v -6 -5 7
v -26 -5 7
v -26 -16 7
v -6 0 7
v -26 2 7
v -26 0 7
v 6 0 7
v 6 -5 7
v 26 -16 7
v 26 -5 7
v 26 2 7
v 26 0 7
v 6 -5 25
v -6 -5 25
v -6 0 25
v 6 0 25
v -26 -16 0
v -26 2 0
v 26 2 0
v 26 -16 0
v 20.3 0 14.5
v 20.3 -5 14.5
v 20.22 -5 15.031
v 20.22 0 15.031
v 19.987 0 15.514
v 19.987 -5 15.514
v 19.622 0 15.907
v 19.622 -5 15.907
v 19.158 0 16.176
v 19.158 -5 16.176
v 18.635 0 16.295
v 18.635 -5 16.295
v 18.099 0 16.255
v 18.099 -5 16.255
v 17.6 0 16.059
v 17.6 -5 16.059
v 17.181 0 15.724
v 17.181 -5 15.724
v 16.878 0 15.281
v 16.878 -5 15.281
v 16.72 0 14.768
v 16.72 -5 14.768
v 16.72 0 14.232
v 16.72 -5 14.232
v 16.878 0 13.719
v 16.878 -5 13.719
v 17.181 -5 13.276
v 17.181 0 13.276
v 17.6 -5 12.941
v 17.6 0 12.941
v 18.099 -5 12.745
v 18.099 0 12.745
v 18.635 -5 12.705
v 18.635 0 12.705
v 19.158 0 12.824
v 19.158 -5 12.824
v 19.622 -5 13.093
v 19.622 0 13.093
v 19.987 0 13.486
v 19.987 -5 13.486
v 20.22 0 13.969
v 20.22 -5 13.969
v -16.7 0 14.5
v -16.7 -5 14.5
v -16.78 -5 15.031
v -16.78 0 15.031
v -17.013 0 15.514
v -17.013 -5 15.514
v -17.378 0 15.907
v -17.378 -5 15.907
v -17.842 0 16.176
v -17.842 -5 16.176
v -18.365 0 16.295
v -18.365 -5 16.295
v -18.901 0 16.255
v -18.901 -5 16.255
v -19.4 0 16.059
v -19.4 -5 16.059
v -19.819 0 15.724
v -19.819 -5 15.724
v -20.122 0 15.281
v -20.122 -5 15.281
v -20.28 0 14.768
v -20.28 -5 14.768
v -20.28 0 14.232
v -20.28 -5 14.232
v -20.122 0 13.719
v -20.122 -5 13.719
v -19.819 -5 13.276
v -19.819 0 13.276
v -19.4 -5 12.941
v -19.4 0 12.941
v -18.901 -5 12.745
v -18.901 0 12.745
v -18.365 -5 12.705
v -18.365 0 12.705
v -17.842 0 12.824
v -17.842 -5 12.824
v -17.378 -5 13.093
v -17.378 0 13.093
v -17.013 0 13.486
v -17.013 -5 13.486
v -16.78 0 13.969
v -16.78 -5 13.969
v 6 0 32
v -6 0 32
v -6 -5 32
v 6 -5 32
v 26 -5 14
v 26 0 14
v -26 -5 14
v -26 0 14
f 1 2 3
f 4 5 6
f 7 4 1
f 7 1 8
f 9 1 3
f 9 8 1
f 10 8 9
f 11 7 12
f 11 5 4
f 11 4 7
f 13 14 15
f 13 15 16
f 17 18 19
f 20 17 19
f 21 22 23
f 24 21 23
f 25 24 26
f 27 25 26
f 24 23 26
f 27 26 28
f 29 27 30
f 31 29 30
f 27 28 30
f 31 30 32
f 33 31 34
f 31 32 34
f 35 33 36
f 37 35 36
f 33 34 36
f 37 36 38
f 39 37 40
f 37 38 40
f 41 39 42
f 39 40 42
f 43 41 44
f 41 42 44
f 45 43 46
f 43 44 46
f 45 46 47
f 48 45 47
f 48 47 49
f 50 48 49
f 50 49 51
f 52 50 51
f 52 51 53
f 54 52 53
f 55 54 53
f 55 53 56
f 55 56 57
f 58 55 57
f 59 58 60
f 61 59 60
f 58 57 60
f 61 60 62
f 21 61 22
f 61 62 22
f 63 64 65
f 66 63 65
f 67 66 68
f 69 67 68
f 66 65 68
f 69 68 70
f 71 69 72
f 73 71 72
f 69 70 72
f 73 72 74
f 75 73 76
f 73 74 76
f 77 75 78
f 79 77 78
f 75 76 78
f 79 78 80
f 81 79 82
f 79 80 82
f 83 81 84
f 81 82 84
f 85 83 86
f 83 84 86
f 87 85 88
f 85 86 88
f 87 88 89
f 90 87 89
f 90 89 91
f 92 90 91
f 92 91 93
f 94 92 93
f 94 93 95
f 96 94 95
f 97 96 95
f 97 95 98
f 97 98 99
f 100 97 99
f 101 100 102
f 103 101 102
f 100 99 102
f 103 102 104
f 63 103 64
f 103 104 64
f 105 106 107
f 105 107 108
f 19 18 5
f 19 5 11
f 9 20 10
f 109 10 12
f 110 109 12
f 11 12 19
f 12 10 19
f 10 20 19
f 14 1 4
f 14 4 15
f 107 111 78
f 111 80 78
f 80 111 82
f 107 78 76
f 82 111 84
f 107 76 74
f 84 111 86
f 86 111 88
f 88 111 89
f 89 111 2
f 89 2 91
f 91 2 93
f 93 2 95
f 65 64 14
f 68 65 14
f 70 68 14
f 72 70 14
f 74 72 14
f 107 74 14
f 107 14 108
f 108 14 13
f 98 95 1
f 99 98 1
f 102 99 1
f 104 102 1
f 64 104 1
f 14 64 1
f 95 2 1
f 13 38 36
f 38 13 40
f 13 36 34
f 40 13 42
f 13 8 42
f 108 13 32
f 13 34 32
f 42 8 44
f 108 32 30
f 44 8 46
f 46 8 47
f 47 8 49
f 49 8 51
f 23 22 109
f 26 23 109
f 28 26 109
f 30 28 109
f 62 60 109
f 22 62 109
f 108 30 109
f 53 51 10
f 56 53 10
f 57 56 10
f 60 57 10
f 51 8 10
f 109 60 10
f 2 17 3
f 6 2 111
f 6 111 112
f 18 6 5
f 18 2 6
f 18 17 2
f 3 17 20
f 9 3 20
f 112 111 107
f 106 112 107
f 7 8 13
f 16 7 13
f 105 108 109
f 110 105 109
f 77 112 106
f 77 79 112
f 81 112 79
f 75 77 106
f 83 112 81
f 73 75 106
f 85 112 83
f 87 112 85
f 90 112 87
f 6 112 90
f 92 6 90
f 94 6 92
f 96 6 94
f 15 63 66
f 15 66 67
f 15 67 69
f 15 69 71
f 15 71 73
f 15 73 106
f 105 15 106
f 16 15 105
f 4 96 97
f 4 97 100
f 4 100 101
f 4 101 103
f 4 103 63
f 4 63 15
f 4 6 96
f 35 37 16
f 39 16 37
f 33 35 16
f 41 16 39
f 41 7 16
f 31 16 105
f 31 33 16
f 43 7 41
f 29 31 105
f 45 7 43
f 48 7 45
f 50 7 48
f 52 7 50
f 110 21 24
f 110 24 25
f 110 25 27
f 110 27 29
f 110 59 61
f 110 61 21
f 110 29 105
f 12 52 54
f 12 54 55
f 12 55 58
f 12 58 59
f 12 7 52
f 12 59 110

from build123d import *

# Parameters (mm, degrees)
SKETCH_W     = 52
SKETCH_H     = 18
PAD_DEPTH    = 7
SKETCH001_W  = 52
SKETCH001_H  = 5
PAD001_DEPTH = 25
SKETCH002_R  = 1.8
SKETCH002_W  = 12
SKETCH002_H  = 18
POCKET_DEPTH = 5


with BuildPart() as part:
    # Sketch → Pad (new body)
    with BuildSketch(Plane.XY):
        with Locations((0, -7)):
            Rectangle(SKETCH_W, SKETCH_H)
    extrude(amount=PAD_DEPTH)

    # Sketch001 → Pad001 (new body)
    with BuildSketch(Plane.XY.offset(7)):
        with Locations((0, -2.5)):
            Rectangle(SKETCH001_W, SKETCH001_H)
    extrude(amount=PAD001_DEPTH)

    # Sketch002 → Pocket (cut)
    with BuildSketch(Plane.XZ.offset(5)):
        with Locations((-18.5, 14.5)):
            Circle(SKETCH002_R)
        with Locations((18.5, 14.5)):
            Circle(SKETCH002_R)
        with Locations((0, 16)):
            Rectangle(SKETCH002_W, SKETCH002_H)
        Polygon((-26, 14), (-6, 32), (-26, 32), align=None)
        Polygon((6, 32), (26, 14), (26, 32), align=None)
    extrude(amount=-POCKET_DEPTH, mode=Mode.SUBTRACT)


solid = part.part
